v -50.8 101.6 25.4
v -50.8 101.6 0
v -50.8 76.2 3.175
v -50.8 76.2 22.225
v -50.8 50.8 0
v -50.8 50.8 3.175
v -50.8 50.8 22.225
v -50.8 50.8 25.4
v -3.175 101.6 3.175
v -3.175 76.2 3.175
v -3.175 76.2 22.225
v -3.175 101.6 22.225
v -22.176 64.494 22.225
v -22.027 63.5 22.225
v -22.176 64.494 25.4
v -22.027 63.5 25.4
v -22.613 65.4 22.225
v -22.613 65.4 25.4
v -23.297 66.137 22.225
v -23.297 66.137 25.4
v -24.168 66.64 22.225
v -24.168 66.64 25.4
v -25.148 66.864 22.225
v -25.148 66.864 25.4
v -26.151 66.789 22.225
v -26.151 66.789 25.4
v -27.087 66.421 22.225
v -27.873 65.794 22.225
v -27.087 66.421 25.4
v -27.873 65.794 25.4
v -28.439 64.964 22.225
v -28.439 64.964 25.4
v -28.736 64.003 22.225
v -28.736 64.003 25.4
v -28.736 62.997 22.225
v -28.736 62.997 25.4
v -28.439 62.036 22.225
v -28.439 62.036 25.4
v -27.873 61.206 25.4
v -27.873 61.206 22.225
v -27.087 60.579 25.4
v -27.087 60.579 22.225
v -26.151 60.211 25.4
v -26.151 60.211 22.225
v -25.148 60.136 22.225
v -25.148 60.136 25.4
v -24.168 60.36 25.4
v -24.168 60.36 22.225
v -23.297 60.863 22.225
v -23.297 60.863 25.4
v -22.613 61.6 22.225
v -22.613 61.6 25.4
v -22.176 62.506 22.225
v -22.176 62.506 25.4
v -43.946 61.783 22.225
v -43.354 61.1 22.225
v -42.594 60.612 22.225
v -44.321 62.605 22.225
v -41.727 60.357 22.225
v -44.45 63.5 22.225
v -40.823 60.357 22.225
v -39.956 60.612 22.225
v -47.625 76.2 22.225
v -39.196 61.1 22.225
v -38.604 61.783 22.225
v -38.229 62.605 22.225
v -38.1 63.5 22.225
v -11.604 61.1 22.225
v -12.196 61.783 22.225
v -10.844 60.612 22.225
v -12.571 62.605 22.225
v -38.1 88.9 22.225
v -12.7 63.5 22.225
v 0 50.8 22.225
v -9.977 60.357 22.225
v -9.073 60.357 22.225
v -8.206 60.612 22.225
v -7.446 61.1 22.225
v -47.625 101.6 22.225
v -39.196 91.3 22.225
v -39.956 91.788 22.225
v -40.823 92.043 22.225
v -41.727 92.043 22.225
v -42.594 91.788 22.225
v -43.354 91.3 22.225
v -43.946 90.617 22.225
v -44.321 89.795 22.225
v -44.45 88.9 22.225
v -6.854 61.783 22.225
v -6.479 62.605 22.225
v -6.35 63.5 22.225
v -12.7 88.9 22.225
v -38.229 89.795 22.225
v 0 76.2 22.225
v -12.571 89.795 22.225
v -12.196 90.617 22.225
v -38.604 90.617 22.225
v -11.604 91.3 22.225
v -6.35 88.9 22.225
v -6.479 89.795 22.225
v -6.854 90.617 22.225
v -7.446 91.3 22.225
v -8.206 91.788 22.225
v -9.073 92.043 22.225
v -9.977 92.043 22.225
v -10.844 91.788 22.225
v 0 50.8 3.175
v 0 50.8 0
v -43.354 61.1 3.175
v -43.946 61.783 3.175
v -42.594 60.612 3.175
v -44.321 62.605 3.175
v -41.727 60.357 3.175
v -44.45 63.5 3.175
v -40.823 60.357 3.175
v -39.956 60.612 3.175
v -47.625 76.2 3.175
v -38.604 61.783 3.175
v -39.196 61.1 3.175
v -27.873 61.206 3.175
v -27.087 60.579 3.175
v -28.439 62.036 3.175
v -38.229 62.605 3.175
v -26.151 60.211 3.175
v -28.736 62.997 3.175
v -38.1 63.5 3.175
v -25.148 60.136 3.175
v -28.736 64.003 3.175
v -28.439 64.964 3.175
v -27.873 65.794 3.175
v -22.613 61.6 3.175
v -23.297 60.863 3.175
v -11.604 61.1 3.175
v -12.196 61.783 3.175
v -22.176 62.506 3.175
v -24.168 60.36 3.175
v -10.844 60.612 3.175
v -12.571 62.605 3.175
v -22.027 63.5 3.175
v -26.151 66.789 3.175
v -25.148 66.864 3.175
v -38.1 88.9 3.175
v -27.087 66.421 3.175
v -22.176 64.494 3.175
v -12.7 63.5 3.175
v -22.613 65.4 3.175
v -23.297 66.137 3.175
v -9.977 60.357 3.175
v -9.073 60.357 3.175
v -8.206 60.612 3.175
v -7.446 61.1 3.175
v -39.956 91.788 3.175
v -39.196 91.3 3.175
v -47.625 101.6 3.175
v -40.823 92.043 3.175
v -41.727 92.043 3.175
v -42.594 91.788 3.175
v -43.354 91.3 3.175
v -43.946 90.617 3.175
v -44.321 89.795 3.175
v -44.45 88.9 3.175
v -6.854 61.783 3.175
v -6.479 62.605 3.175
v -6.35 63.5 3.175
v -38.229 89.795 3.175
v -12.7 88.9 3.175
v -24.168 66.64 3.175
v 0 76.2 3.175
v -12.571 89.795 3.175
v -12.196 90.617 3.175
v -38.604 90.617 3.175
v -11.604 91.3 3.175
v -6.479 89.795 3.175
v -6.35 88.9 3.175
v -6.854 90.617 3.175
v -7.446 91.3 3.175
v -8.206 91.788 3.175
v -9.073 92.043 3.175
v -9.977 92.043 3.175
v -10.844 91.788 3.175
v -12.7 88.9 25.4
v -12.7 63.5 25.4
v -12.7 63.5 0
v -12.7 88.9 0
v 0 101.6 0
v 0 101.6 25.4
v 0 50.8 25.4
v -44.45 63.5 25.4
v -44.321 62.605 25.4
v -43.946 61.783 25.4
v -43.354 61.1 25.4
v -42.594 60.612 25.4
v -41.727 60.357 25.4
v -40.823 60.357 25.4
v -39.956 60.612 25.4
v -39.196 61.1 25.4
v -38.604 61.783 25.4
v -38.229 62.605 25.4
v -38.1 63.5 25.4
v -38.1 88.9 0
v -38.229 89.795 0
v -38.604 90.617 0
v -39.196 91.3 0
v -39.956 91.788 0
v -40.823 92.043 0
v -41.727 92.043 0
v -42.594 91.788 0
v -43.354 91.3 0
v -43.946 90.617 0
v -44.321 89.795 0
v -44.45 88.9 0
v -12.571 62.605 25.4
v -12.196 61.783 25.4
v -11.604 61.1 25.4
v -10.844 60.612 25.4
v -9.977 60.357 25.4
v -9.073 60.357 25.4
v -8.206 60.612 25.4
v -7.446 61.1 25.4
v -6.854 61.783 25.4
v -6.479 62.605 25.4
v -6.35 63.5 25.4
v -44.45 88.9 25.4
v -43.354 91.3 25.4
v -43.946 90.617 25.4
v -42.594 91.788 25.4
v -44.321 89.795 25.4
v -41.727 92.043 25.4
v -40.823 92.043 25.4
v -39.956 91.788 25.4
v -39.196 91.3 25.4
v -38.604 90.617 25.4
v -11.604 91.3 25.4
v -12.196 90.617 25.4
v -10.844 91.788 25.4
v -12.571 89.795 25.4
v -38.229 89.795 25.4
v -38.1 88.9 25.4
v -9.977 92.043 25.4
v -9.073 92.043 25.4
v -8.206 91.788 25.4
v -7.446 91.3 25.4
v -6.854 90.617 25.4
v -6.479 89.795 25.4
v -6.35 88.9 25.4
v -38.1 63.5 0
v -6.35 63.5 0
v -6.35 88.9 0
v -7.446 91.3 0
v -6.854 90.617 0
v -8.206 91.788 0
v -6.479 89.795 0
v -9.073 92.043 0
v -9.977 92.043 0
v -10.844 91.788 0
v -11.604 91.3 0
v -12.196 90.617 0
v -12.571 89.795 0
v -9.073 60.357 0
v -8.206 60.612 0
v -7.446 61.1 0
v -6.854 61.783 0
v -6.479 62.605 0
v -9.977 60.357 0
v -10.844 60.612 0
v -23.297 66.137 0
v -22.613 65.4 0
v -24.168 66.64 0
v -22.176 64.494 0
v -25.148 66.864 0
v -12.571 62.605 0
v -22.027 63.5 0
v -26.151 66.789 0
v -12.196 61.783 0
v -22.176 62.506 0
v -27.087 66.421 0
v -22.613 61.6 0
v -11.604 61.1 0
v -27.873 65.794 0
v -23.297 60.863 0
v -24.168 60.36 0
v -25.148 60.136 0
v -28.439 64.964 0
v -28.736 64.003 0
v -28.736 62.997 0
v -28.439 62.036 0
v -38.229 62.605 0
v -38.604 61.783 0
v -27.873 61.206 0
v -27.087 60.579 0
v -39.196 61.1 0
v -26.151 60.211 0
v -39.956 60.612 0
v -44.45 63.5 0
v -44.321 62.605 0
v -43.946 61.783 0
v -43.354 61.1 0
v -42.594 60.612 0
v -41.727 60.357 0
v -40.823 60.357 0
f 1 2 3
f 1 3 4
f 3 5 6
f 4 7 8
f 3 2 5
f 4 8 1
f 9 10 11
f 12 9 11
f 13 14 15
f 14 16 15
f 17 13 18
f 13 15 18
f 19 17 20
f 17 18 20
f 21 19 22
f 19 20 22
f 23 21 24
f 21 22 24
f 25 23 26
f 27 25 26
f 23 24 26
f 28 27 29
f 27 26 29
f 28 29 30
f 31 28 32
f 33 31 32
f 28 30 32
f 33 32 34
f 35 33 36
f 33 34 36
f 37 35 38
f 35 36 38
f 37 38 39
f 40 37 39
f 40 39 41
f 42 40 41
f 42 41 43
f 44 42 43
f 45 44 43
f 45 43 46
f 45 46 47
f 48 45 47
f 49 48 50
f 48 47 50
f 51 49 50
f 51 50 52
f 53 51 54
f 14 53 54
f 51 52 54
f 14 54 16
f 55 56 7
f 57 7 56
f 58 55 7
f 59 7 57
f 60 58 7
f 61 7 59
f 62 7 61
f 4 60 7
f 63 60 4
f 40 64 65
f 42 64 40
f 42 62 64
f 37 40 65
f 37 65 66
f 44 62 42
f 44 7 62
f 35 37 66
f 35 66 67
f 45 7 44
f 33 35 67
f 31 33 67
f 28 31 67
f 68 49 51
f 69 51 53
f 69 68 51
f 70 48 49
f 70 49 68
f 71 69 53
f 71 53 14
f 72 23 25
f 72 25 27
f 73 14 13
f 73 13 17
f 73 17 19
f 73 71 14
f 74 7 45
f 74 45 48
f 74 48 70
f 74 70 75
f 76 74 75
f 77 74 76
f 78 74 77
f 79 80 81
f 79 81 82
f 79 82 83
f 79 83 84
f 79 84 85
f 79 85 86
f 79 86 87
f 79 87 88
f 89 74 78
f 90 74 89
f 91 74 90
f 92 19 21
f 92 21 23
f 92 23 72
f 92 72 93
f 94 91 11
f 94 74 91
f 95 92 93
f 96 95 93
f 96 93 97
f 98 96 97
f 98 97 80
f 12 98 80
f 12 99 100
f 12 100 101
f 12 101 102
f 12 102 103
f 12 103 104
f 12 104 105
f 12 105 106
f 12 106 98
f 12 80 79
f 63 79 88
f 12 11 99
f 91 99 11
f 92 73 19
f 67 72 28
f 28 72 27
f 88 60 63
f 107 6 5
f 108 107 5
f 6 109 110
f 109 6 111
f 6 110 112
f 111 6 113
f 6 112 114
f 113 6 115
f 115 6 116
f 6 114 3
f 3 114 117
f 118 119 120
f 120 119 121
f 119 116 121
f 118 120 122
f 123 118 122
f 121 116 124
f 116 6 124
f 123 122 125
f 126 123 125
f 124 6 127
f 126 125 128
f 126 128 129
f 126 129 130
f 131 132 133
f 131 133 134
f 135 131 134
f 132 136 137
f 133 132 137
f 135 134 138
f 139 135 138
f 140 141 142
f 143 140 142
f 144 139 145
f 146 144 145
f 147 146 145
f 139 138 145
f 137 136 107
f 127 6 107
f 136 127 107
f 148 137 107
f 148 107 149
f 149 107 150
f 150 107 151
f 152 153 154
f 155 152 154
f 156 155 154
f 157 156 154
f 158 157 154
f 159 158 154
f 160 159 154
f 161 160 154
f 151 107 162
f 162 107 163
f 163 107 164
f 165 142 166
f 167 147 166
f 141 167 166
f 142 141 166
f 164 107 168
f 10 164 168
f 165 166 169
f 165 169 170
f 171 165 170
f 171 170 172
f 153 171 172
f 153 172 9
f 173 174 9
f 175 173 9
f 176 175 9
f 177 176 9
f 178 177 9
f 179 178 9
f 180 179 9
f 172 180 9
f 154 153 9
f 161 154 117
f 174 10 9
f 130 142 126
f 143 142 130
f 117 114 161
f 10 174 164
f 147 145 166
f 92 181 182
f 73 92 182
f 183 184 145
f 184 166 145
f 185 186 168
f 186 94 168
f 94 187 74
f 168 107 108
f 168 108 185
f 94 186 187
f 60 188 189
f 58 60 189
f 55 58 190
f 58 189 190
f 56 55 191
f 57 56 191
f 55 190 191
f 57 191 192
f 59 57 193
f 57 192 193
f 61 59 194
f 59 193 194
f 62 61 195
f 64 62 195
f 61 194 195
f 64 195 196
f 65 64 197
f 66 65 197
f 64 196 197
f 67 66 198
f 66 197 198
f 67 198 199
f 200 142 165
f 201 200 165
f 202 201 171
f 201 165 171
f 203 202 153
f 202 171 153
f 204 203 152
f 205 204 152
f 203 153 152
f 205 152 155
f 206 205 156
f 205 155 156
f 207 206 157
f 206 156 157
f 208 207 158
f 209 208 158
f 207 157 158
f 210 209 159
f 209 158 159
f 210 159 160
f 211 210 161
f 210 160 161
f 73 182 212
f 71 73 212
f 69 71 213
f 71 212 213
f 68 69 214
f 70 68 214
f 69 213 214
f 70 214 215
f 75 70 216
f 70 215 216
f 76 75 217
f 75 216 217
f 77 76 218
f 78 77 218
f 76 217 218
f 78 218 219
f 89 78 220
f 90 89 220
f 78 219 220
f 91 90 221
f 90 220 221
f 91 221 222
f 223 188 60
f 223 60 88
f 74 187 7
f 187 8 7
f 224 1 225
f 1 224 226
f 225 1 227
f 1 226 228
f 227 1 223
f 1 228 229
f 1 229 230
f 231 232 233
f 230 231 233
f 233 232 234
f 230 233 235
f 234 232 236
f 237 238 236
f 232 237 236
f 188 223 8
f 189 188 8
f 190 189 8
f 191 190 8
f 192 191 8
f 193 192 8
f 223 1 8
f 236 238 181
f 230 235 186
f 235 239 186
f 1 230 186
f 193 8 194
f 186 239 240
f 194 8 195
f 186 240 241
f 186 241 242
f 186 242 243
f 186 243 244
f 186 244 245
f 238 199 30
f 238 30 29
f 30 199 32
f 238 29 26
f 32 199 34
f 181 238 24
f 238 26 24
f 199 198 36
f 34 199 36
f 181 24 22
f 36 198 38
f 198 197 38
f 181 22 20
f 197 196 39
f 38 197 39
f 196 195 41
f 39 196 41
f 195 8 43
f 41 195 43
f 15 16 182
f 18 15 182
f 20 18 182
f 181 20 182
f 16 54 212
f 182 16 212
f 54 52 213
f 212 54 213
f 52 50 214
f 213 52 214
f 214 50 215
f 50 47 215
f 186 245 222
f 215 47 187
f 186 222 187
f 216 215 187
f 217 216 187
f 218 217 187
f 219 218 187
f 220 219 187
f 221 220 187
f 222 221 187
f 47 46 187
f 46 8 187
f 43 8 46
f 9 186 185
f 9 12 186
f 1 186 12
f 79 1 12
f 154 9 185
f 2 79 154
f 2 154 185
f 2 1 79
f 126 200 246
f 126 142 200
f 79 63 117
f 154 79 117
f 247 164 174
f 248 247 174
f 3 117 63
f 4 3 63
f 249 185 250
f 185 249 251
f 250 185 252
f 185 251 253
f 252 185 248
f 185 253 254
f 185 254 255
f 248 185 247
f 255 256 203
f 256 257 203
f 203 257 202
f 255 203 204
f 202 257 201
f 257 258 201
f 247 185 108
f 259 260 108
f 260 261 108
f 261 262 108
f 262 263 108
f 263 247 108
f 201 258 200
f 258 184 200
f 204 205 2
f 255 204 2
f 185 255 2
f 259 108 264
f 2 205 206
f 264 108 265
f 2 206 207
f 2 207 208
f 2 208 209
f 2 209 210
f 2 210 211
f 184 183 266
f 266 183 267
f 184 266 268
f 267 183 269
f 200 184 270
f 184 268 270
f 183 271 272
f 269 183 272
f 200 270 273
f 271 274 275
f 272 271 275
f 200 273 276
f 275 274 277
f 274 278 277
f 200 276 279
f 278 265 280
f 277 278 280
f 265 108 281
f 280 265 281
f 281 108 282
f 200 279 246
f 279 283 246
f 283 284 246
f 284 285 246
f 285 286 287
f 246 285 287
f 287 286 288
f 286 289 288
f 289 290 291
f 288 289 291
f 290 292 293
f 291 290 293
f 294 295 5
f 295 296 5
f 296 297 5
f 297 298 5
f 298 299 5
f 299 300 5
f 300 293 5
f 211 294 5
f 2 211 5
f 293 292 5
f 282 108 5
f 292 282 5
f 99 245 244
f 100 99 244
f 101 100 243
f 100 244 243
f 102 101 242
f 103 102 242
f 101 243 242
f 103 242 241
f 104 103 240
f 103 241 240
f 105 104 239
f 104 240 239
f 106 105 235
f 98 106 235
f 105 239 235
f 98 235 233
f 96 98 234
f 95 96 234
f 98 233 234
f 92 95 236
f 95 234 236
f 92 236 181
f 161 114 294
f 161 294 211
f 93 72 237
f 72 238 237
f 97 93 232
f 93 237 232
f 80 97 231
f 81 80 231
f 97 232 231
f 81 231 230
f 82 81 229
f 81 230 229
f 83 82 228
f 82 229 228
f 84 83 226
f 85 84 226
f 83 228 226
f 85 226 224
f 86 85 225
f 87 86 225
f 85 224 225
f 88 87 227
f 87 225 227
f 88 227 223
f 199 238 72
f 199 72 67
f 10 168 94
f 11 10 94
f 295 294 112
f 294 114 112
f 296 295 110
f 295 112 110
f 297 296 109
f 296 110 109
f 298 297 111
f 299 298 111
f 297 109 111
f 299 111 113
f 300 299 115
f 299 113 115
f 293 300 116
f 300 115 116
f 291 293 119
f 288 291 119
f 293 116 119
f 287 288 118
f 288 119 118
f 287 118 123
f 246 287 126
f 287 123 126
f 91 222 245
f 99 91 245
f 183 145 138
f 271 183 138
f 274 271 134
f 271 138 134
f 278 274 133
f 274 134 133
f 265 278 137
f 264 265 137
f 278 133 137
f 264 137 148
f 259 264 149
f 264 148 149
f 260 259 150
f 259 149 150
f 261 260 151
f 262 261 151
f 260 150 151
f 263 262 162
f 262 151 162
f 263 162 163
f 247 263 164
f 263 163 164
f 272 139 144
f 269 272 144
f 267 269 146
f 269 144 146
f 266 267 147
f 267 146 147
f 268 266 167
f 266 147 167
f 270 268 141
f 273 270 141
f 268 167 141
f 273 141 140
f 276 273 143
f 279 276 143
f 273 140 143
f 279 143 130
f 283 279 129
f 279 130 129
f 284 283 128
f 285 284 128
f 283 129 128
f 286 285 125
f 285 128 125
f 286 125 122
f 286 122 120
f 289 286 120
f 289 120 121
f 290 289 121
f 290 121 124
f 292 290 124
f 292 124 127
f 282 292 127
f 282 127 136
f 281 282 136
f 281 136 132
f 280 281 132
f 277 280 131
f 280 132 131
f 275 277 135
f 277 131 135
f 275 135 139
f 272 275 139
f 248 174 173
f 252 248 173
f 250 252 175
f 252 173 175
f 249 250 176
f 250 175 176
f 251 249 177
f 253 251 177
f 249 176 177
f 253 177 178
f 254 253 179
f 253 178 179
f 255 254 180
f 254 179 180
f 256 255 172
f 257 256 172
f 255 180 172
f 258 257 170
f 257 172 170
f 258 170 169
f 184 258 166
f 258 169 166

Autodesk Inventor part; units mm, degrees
ref_plane "YZ Plane" through (0, 0, 0) normal (1, 0, 0) x (0, 1, 0)
ref_plane "XZ Plane" through (0, 0, 0) normal (0, 1, 0) x (-1, 0, 0)
ref_plane "XY Plane" through (0, 0, 0) normal (0, 0, 1) x (1, 0, 0)
ref_plane "Work Plane1" through (0, 50.8, 0) normal (0, 1, 0) x (0, 0, -1)
sketch "Sketch1" plane through (0, 50.8, 0) normal (0, 1, 0) x (0, 0, -1)
  line L0 (0, 50.8) -> (-25.4, 50.8)
  line L1 (-25.4, 50.8) -> (-25.4, 0)
  line L2 (-25.4, 0) -> (0, 0)
  line L3 (0, 0) -> (0, 50.8)
  line L4 (-3.175, 3.175) -> (-22.225, 3.175)
  line L5 (-22.225, 3.175) -> (-22.225, 47.625)
  line L6 (-22.225, 47.625) -> (-3.175, 47.625)
  line L7 (-3.175, 47.625) -> (-3.175, 3.175)
  point P0 (0, 0)
  dimension "d0" = 25.4
  dimension "d1" = 50.8
  dimension "d9" = 3.175
extrude "Extrusion3" add sketch "Sketch1" along normal blind 50.8
sketch "Sketch3" plane through (-50.8, 50.8, 25.4) normal (0, 0, 1) x (1, 0, 0)
  circle A0 centre (25.4, 12.7) radius 3.3734
  line L0 (0, 0) -> (50.8, 0) projected
  line L1 (0, 0) -> (0, 50.8) projected
  line L2 (41.275, 38.1) -> (41.275, 12.7) construction
  line L3 (38.1, 38.1) -> (38.1, 12.7)
  line L4 (44.45, 12.7) -> (44.45, 38.1)
  arc A1 (44.45, 38.1) -> (38.1, 38.1) centre (41.275, 38.1) ccw
  arc A2 (38.1, 12.7) -> (44.45, 12.7) centre (41.275, 12.7) ccw
  line L5 (50.8, 0) -> (50.8, 50.8) projected
  line L6 (3.175, 0) -> (47.625, 0) construction
  line L7 (25.4, 0) -> (25.4, 50.8) construction
  line L8 (47.625, 50.8) -> (3.175, 50.8) construction
  line L9 (12.7, 38.1) -> (12.7, 12.7)
  line L10 (6.35, 12.7) -> (6.35, 38.1)
  arc A3 (12.7, 38.1) -> (6.35, 38.1) centre (9.525, 38.1) ccw
  arc A4 (6.35, 12.7) -> (12.7, 12.7) centre (9.525, 12.7) ccw
  point P0 (50.8, -50.8)
  point P1 (41.275, 25.4)
  dimension "d12" = 6.7469
  dimension "d13" = 12.7
  dimension "d14" = 25.4
  dimension "d20" = 6.35
  dimension "d21" = 25.4
  dimension "d22" = 9.525
  dimension "d23" = 25.4
extrude "Extrusion4" cut sketch "Sketch3" against normal blind 25.4
sketch "Sketch4" plane through (0, 50.8, 25.4) normal (1, 0, 0) x (0, 0, -1)
  line L0 (3.175, 0) -> (3.175, 50.8) projected
  line L1 (22.225, 0) -> (22.225, 50.8) projected
  line L2 (3.175, 0) -> (22.225, 0)
  line L3 (22.225, 0) -> (22.225, 25.4)
  line L4 (22.225, 25.4) -> (3.175, 25.4)
  line L5 (3.175, 25.4) -> (3.175, 0)
  point P0 (25.4, -50.8)
  dimension "d17" = 25.4
extrude "Extrusion5" cut sketch "Sketch4" against normal blind 50.8
properties part number "block"
